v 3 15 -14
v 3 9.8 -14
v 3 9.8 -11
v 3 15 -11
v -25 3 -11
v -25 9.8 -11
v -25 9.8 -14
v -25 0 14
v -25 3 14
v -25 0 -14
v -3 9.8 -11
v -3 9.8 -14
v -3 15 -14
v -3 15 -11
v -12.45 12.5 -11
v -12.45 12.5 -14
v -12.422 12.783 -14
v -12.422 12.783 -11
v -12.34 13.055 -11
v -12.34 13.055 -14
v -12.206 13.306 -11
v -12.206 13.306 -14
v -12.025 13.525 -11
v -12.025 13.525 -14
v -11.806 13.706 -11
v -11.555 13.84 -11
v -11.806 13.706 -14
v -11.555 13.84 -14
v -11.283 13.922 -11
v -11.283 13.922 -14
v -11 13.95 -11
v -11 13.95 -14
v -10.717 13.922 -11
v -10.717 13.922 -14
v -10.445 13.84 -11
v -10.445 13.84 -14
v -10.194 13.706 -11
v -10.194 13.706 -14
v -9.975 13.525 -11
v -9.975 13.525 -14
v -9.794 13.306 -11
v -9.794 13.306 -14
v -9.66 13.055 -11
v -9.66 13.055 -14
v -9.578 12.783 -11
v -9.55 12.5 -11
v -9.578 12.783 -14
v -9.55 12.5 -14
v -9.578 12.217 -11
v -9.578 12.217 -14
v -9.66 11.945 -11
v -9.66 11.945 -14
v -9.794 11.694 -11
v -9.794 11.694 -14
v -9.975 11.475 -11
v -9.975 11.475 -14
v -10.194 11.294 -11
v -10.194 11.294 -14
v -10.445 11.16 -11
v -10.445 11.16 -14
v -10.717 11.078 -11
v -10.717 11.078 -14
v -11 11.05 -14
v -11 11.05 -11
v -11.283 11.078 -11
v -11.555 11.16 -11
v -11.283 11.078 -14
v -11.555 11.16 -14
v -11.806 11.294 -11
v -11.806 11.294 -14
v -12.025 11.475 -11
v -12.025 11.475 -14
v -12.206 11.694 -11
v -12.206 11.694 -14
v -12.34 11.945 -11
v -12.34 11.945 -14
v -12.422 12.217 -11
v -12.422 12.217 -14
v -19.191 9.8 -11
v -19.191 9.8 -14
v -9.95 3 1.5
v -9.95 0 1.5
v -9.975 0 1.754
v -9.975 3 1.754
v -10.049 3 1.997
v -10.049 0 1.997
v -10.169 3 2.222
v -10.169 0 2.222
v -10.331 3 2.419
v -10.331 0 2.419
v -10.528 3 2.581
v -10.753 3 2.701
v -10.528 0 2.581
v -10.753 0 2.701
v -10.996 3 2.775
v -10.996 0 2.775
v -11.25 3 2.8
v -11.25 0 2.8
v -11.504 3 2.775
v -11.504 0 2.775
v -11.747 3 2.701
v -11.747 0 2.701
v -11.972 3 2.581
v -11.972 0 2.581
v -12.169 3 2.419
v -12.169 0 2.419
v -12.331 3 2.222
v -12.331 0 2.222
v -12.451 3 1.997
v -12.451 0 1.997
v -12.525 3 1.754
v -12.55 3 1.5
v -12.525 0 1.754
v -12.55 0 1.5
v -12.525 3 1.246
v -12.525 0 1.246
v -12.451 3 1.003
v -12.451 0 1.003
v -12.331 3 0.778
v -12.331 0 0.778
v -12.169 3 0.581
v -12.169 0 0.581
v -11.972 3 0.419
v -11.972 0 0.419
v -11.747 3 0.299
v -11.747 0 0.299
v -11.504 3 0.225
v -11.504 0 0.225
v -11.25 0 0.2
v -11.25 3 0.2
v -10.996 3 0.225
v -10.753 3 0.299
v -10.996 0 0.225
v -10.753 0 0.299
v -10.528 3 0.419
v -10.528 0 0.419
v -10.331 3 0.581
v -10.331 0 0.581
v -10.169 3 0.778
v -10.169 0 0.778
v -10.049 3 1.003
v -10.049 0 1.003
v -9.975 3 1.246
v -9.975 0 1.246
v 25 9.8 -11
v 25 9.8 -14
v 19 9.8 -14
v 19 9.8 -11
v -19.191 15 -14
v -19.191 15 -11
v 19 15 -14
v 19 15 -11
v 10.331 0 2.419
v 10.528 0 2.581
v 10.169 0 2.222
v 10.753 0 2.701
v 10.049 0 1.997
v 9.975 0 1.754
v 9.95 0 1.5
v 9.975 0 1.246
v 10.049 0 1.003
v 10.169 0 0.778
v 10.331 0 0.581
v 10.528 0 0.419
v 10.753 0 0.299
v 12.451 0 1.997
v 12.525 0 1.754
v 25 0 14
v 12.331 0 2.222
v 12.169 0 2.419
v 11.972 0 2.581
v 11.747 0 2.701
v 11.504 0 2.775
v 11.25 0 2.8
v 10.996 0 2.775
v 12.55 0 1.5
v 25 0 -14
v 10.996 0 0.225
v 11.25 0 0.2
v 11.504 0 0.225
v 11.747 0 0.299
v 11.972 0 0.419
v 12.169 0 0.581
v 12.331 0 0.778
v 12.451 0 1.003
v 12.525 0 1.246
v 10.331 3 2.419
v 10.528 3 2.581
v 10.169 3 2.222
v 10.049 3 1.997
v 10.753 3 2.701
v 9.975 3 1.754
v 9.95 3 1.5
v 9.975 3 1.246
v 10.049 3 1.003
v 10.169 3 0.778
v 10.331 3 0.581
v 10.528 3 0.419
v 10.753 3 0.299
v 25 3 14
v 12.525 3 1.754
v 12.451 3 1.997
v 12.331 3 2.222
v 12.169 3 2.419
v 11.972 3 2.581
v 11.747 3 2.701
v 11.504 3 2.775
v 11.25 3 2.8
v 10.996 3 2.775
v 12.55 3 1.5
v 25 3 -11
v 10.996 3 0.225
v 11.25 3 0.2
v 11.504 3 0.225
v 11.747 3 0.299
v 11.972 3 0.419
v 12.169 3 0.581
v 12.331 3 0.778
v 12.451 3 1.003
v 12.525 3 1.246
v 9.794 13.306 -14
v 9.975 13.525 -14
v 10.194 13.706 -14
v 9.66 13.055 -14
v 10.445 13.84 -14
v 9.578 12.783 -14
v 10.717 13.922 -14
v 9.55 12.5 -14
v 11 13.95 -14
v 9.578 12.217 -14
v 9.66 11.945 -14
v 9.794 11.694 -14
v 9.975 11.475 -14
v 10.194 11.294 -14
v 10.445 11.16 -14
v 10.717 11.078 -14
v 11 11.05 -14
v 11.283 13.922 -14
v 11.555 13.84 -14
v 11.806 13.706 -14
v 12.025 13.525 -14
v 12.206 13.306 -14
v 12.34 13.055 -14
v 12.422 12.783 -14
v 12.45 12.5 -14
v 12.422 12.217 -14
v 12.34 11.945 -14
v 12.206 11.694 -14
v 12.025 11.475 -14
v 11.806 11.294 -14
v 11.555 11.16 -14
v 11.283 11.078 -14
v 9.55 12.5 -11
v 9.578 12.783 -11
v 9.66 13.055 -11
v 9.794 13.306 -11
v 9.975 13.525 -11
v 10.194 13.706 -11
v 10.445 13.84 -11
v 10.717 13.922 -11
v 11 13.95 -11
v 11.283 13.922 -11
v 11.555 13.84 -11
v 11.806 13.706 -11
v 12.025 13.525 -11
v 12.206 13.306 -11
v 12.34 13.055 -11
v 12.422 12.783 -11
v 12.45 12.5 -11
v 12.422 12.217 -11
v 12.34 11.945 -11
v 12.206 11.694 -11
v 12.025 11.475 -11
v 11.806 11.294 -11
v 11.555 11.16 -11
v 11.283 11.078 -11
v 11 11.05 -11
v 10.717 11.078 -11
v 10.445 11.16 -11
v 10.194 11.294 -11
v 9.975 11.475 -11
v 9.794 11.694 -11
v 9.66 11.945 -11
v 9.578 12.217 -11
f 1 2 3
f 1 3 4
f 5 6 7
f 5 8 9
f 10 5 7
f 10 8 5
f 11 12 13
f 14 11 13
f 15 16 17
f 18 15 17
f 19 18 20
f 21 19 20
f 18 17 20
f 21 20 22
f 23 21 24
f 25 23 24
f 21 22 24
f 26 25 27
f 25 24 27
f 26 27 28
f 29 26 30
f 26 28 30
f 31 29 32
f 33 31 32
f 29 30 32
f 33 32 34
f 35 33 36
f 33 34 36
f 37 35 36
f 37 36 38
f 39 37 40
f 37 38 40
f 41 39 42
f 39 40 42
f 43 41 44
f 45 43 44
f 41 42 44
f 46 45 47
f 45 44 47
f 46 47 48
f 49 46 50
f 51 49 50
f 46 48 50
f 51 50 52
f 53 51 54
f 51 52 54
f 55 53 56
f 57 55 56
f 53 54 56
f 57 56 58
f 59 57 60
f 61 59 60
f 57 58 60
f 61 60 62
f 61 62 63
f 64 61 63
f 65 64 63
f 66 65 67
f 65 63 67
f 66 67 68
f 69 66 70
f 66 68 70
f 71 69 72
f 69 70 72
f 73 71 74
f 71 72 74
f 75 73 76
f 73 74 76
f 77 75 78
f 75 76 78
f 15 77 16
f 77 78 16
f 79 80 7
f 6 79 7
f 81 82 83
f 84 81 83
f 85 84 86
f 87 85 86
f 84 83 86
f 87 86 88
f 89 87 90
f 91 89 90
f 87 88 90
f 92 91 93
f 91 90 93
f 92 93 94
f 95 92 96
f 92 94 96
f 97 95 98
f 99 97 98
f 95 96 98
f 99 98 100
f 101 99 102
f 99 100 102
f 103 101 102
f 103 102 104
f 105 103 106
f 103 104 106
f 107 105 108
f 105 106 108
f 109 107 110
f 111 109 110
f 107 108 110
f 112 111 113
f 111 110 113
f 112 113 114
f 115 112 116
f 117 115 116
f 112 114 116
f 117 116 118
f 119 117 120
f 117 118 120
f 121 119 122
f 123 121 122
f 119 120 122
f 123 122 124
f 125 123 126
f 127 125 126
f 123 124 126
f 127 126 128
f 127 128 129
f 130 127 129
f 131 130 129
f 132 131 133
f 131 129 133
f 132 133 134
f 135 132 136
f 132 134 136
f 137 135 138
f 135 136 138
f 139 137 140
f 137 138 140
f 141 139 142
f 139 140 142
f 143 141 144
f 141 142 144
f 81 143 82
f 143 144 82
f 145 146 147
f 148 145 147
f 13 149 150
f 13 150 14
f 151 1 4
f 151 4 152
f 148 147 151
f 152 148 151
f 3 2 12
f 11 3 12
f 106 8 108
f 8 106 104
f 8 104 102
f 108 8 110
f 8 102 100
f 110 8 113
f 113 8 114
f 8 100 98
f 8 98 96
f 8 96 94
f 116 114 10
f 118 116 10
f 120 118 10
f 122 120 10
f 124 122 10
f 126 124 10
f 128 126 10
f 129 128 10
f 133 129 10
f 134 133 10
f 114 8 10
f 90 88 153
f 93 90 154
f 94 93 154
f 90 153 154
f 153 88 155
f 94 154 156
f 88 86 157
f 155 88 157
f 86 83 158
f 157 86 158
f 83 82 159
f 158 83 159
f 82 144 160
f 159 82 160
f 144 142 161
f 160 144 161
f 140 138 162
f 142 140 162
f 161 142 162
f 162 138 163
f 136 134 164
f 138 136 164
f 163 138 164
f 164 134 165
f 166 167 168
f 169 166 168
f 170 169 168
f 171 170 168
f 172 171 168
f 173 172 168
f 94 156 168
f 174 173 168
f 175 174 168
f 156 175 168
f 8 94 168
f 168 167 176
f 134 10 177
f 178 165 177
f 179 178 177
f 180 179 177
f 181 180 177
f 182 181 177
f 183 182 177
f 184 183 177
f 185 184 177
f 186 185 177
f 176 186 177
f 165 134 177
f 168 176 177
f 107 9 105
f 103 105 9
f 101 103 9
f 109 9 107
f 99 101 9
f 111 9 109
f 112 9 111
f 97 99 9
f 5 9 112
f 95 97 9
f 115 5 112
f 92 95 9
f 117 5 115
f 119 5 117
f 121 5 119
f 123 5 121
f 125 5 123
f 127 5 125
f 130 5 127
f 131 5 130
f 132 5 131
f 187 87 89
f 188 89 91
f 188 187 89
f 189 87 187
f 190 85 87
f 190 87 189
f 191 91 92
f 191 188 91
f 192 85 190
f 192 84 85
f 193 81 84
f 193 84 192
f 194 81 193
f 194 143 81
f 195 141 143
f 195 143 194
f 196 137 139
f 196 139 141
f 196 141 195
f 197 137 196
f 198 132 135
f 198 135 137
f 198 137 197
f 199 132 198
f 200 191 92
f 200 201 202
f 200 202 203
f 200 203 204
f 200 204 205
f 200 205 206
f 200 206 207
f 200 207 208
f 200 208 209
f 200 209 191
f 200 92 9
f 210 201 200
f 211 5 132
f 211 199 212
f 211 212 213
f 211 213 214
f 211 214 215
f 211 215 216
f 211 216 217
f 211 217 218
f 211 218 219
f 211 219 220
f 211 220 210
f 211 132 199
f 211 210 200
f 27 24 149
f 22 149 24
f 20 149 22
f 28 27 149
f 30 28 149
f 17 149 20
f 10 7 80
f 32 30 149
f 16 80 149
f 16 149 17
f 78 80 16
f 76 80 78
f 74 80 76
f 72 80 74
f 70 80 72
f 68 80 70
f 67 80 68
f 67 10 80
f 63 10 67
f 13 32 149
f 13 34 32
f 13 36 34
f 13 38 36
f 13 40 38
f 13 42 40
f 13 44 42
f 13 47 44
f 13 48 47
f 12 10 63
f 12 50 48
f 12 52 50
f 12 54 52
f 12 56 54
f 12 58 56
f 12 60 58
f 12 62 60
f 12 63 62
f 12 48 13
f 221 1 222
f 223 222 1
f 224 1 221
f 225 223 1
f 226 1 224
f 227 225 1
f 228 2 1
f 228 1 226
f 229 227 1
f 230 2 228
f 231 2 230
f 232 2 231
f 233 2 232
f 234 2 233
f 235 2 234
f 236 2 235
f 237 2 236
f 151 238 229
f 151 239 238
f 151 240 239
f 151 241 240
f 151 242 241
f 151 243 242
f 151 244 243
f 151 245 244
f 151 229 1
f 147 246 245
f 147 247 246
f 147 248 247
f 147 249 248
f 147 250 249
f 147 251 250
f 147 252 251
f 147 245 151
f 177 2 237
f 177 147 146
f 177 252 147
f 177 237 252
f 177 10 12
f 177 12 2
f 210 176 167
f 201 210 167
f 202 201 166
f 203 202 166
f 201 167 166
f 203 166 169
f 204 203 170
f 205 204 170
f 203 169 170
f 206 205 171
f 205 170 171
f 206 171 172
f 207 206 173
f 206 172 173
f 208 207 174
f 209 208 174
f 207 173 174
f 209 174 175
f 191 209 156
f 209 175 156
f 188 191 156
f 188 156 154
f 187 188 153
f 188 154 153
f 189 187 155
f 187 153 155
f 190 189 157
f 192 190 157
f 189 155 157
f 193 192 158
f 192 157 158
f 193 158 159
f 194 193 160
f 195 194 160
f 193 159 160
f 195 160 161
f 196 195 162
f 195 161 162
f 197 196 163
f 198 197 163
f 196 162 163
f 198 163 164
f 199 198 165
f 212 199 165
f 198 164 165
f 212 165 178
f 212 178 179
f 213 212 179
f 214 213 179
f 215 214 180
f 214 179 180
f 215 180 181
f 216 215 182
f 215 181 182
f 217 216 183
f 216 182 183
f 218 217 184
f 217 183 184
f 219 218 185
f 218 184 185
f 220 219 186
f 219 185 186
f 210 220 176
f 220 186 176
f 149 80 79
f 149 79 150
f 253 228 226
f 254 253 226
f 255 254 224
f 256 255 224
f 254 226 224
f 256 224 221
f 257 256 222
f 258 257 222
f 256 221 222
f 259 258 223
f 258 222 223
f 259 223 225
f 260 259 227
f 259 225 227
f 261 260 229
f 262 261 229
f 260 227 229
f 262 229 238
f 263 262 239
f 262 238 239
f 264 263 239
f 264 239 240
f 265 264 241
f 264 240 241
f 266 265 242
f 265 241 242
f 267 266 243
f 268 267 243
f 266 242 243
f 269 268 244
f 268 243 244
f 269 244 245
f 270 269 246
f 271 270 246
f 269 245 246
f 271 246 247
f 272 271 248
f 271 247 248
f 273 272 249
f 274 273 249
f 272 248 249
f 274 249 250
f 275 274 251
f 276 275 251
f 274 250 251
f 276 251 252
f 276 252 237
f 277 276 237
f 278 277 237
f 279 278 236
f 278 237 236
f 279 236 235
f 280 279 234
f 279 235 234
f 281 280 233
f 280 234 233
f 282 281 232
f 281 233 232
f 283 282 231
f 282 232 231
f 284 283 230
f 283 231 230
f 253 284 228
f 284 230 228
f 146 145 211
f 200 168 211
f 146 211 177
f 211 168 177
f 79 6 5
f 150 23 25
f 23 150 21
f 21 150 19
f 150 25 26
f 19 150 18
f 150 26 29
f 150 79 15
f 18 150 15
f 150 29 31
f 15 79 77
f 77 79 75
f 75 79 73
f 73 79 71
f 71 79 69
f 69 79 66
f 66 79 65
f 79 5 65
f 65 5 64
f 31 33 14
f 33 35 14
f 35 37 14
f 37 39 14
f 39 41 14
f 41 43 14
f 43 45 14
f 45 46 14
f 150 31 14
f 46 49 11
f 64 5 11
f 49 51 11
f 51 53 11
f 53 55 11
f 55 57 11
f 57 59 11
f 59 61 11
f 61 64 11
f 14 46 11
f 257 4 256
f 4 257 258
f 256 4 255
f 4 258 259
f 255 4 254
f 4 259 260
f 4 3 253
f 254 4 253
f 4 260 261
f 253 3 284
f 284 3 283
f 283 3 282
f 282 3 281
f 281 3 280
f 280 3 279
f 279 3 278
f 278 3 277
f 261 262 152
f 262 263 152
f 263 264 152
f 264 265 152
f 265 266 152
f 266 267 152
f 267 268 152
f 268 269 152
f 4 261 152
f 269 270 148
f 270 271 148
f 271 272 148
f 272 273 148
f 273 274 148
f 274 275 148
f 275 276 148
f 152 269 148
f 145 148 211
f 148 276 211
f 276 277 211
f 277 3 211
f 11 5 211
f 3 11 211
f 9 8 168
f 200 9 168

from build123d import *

# Parameters (mm, degrees)
SKETCH1_W           = 50
SKETCH1_H           = 28
BOSS_EXTRUDE1_DEPTH = 3
SKETCH2_W           = 50
SKETCH2_H           = 3
BOSS_EXTRUDE2_DEPTH = 12
SKETCH6_W           = 6
SKETCH6_H           = 5.2
CUT_EXTRUDE2_DEPTH  = 3
SKETCH7_R           = 1.3
CUT_EXTRUDE3_DEPTH  = 3
SKETCH8_R           = 1.45
CUT_EXTRUDE4_DEPTH  = 3


with BuildPart() as part:
    # Sketch1 → Boss-Extrude1 (new body)
    with BuildSketch(Plane(origin=(0, 0, 0), x_dir=(1, 0, 0), z_dir=(0, 1, 0))):
        Rectangle(SKETCH1_W, SKETCH1_H)
    extrude(amount=BOSS_EXTRUDE1_DEPTH)

    # Sketch2 → Boss-Extrude2 (add)
    with BuildSketch(Plane(origin=(0, 3, 0), x_dir=(1, 0, 0), z_dir=(0, 1, 0))):
        with Locations((0, 12.5)):
            Rectangle(SKETCH2_W, SKETCH2_H)
    extrude(amount=BOSS_EXTRUDE2_DEPTH)

    # Sketch6 → Cut-Extrude2 (cut)
    with BuildSketch(Plane(origin=(0, 0, -14), x_dir=(-1, 0, 0), z_dir=(0, 0, -1))):
        with Locations((-22, 12.4)):
            Rectangle(SKETCH6_W, SKETCH6_H)
        with Locations((0, 12.4)):
            Rectangle(SKETCH6_W, SKETCH6_H)
        with Locations((22.191038301, 12.4)):
            Rectangle(SKETCH6_W, SKETCH6_H)
    extrude(amount=-CUT_EXTRUDE2_DEPTH, mode=Mode.SUBTRACT)

    # Sketch7 → Cut-Extrude3 (cut)
    with BuildSketch(Plane.XZ):
        with Locations((-11.25, 1.5)):
            Circle(SKETCH7_R)
        with Locations((11.25, 1.5)):
            Circle(SKETCH7_R)
    extrude(amount=-CUT_EXTRUDE3_DEPTH, mode=Mode.SUBTRACT)

    # Sketch8 → Cut-Extrude4 (cut)
    with BuildSketch(Plane(origin=(0, 0, -14), x_dir=(-1, 0, 0), z_dir=(0, 0, -1))):
        with Locations((-11, 12.5)):
            Circle(SKETCH8_R)
        with Locations((11, 12.5)):
            Circle(SKETCH8_R)
    extrude(amount=-CUT_EXTRUDE4_DEPTH, mode=Mode.SUBTRACT)


solid = part.part
